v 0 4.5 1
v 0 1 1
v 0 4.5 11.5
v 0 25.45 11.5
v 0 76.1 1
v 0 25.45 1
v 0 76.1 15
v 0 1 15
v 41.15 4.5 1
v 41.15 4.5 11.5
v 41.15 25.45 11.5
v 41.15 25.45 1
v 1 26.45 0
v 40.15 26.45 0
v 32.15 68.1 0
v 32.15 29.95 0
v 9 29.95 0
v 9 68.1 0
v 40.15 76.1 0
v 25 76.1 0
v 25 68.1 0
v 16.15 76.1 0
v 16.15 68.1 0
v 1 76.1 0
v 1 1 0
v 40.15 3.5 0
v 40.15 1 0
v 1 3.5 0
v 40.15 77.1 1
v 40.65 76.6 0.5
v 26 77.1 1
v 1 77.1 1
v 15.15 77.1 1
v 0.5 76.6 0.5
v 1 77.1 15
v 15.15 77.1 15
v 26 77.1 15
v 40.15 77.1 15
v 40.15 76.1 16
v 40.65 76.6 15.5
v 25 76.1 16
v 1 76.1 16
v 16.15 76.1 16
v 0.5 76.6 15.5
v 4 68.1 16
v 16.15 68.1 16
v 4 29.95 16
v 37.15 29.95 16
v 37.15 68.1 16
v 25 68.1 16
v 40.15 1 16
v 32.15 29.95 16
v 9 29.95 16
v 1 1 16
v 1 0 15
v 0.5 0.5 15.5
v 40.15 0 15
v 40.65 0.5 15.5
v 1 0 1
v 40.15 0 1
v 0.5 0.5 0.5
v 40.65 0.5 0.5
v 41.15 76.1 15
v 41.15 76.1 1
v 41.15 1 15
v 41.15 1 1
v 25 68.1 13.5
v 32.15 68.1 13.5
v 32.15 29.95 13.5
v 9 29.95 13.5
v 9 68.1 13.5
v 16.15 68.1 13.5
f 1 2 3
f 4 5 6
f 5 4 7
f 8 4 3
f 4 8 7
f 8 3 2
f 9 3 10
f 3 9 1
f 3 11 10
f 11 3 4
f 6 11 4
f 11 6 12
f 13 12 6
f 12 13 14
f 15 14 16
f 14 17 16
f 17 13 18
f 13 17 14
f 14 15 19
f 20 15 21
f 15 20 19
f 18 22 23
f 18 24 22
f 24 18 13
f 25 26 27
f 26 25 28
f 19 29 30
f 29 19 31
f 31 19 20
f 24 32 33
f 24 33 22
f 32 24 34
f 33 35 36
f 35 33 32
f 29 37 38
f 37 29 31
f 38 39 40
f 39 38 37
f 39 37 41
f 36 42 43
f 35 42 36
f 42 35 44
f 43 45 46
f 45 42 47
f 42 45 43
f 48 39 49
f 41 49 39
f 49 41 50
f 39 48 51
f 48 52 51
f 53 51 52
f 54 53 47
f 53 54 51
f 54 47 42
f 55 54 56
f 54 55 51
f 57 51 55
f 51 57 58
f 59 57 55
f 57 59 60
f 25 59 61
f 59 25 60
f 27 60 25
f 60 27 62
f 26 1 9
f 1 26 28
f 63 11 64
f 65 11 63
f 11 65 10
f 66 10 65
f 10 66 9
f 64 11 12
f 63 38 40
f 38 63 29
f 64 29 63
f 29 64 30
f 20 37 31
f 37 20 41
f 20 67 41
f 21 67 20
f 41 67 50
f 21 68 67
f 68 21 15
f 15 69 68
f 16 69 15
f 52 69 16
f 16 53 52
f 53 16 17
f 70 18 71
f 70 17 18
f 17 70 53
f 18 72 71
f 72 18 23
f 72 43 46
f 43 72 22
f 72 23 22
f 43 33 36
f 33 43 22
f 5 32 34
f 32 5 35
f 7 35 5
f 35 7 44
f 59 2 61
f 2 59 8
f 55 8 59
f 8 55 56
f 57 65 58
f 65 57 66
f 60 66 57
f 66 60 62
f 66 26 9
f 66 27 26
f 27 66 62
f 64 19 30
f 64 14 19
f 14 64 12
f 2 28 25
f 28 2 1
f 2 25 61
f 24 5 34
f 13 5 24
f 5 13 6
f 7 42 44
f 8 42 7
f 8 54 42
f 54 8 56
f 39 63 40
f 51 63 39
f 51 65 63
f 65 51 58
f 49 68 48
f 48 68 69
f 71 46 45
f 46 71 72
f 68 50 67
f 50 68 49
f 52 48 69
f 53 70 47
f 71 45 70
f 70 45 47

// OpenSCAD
// created by IndiePandaaaaa | Lukas

// REFERENCE: Goobay 3m Safety Plug Extension Cable

MODEL_TOLERANCE = 0.15;
MATERIAL_TICKNESS = 4.5;
CHAMFER = 1;

SCHUKO_SOCKET_WIDTH = 23;
SCHUKO_SOCKET_DEPTH = 38;
BOARD_THICKNESS = 20.8;
CABLE_OD = 9;

FULLWIDTH = MATERIAL_TICKNESS * 4 + MODEL_TOLERANCE + SCHUKO_SOCKET_WIDTH;
FULLDEPTH = MATERIAL_TICKNESS * 4 + MODEL_TOLERANCE * 2 + BOARD_THICKNESS + SCHUKO_SOCKET_DEPTH;
FULLHEIGHT = 16;

difference() {
  intersection() {
    rotate([90, 0, 90])
      linear_extrude(FULLWIDTH) {
        polygon([
            [0, CHAMFER],
            [CHAMFER, 0],
            [MATERIAL_TICKNESS - CHAMFER, 0],
            [MATERIAL_TICKNESS, CHAMFER],
            [MATERIAL_TICKNESS, FULLHEIGHT - MATERIAL_TICKNESS],
            [MATERIAL_TICKNESS + MODEL_TOLERANCE + BOARD_THICKNESS, FULLHEIGHT - MATERIAL_TICKNESS],
            [MATERIAL_TICKNESS + MODEL_TOLERANCE + BOARD_THICKNESS, CHAMFER],
            [MATERIAL_TICKNESS + MODEL_TOLERANCE + BOARD_THICKNESS + CHAMFER, 0],
            [FULLDEPTH - CHAMFER, 0],
            [FULLDEPTH, CHAMFER],
            [FULLDEPTH, FULLHEIGHT - CHAMFER],
            [FULLDEPTH - CHAMFER, FULLHEIGHT],
            [CHAMFER, FULLHEIGHT],
            [0, FULLHEIGHT - CHAMFER],
          ]);
      }
    linear_extrude(FULLHEIGHT) {
      polygon([
          [0, CHAMFER],
          [CHAMFER, 0],
          [FULLWIDTH - CHAMFER, 0],
          [FULLWIDTH, CHAMFER],
          [FULLWIDTH, FULLDEPTH - CHAMFER],
          [FULLWIDTH - CHAMFER, FULLDEPTH],
          [FULLWIDTH - (MATERIAL_TICKNESS * 2 + MODEL_TOLERANCE + SCHUKO_SOCKET_WIDTH / 2 - CABLE_OD / 2) +
          CHAMFER, FULLDEPTH],
          [FULLWIDTH - MATERIAL_TICKNESS * 2 - MODEL_TOLERANCE - SCHUKO_SOCKET_WIDTH / 2 + CABLE_OD / 2,
            FULLDEPTH - CHAMFER],
          [FULLWIDTH - MATERIAL_TICKNESS * 2 - MODEL_TOLERANCE - SCHUKO_SOCKET_WIDTH / 2 + CABLE_OD / 2,
            FULLDEPTH - MATERIAL_TICKNESS * 2],
          [FULLWIDTH - MATERIAL_TICKNESS * 2, FULLDEPTH - MATERIAL_TICKNESS * 2],
          [FULLWIDTH - MATERIAL_TICKNESS * 2, FULLDEPTH - MATERIAL_TICKNESS * 2 - SCHUKO_SOCKET_DEPTH -
          MODEL_TOLERANCE],
          [MATERIAL_TICKNESS * 2, FULLDEPTH - MATERIAL_TICKNESS * 2 - SCHUKO_SOCKET_DEPTH - MODEL_TOLERANCE],
          [MATERIAL_TICKNESS * 2, FULLDEPTH - MATERIAL_TICKNESS * 2],
          [MATERIAL_TICKNESS * 2 + MODEL_TOLERANCE + SCHUKO_SOCKET_WIDTH / 2 - CABLE_OD / 2, FULLDEPTH -
            MATERIAL_TICKNESS * 2],
          [MATERIAL_TICKNESS * 2 + MODEL_TOLERANCE + SCHUKO_SOCKET_WIDTH / 2 - CABLE_OD / 2, FULLDEPTH -
          CHAMFER],
          [MATERIAL_TICKNESS * 2 + MODEL_TOLERANCE + SCHUKO_SOCKET_WIDTH / 2 - CABLE_OD / 2 - CHAMFER,
          FULLDEPTH],
          [CHAMFER, FULLDEPTH],
          [0, FULLDEPTH - CHAMFER],
        ]);
    }
    rotate([-90, 0, 0]) translate([0, -FULLHEIGHT, 0])
      linear_extrude(FULLDEPTH) {
        polygon([
            [0, CHAMFER],
            [CHAMFER, 0],
            [FULLWIDTH - CHAMFER, 0],
            [FULLWIDTH, CHAMFER],
            [FULLWIDTH, FULLHEIGHT - CHAMFER],
            [FULLWIDTH - CHAMFER, FULLHEIGHT],
            [CHAMFER, FULLHEIGHT],
            [0, FULLHEIGHT - CHAMFER],
          ]);
      }
  }
  translate([(FULLWIDTH - (5 * 2 + MODEL_TOLERANCE + SCHUKO_SOCKET_WIDTH)) / 2, FULLDEPTH -
      MATERIAL_TICKNESS * 2, FULLHEIGHT - 2.5]) rotate([90, 0, 0])
    linear_extrude(SCHUKO_SOCKET_DEPTH + MODEL_TOLERANCE) {
      polygon([
          [0, 2.5],
          [5, 0],
          [5 + MODEL_TOLERANCE + SCHUKO_SOCKET_WIDTH, 0],
          [5 * 2 + MODEL_TOLERANCE + SCHUKO_SOCKET_WIDTH, 2.5],
        ]);
    }
}
